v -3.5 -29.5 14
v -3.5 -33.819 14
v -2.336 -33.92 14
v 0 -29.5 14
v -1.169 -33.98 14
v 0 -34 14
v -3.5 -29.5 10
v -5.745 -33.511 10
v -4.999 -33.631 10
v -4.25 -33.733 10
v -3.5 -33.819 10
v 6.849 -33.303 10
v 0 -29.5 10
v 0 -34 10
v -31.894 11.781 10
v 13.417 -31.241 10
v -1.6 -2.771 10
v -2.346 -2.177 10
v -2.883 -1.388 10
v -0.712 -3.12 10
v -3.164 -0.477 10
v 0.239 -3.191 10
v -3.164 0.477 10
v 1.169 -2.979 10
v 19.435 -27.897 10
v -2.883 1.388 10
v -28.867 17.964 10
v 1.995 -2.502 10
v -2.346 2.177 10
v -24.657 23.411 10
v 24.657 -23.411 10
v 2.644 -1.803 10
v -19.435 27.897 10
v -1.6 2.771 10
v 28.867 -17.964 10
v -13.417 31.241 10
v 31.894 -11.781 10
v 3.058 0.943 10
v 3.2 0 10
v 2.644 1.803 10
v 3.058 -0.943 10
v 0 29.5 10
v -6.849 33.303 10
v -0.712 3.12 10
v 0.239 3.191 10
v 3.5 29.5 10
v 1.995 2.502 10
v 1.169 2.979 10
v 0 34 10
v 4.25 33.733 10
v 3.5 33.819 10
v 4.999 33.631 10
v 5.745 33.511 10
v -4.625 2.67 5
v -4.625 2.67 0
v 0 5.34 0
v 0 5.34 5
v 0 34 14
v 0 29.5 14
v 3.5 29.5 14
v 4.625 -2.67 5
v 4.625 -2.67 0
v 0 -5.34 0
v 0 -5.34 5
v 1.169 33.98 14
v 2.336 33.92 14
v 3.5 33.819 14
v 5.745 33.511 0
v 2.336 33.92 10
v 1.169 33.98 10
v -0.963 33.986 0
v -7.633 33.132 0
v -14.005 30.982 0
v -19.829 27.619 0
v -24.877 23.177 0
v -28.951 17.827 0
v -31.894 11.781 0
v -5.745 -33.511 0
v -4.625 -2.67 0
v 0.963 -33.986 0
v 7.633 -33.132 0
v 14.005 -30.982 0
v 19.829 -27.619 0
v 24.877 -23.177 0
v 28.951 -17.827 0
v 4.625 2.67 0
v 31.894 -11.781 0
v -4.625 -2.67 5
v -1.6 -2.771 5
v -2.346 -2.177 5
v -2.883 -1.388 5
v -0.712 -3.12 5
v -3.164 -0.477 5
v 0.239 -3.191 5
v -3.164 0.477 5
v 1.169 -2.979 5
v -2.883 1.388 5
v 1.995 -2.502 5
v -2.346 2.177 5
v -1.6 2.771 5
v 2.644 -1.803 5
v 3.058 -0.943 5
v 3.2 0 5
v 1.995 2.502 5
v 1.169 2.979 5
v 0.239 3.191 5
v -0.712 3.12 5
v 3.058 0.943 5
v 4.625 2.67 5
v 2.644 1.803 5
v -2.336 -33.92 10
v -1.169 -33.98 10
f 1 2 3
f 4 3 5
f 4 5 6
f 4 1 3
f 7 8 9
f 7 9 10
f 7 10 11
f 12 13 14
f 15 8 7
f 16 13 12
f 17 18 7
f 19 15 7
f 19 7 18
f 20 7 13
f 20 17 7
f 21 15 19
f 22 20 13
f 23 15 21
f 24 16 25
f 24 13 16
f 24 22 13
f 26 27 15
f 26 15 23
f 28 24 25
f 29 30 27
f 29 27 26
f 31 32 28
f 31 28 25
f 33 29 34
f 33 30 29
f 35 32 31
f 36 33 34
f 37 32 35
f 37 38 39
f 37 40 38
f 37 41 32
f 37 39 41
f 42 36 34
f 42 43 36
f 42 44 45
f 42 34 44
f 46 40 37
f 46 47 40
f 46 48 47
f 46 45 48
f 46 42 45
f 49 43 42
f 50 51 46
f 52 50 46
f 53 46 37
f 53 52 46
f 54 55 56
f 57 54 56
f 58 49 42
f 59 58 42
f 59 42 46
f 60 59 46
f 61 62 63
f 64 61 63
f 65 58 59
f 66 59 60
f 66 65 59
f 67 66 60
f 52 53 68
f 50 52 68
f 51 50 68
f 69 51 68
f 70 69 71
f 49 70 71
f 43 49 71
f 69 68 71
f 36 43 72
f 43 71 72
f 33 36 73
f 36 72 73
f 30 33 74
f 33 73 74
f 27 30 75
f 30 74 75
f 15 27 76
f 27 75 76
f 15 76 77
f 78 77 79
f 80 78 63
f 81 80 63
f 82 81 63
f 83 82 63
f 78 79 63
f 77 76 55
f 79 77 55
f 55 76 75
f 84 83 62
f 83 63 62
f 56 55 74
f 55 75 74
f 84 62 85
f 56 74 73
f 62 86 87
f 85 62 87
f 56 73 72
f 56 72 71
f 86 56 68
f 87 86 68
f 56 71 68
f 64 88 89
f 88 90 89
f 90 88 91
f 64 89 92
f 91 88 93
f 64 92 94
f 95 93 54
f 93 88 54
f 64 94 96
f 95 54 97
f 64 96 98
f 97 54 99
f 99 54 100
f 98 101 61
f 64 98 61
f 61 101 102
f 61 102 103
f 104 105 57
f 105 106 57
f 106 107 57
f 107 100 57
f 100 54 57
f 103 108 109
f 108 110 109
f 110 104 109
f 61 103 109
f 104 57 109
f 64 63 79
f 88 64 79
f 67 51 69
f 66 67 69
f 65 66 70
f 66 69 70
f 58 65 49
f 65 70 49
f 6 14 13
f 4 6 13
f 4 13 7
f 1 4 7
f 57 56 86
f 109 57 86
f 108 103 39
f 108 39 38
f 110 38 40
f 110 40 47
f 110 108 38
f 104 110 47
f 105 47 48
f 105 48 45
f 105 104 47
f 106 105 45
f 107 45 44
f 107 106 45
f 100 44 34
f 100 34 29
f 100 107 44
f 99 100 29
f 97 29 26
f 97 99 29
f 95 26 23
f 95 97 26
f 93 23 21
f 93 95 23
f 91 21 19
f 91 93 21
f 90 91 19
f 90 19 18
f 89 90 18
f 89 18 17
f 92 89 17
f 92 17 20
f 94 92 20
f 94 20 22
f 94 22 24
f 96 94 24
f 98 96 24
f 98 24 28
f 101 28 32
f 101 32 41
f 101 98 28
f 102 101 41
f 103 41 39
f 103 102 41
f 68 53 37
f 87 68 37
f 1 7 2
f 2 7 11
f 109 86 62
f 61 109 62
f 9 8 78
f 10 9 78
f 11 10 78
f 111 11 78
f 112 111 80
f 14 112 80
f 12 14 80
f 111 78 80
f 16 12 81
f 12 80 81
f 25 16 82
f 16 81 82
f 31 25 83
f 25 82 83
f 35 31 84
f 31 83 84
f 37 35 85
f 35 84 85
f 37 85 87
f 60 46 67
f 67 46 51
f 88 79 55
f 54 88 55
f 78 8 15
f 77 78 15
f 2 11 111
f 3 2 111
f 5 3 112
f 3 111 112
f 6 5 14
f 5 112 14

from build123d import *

# Parameters (mm, degrees)
F0_R     = 34
F1_DEPTH = 5
F2_R     = 34
F2_R_2   = 3.2
F3_DEPTH = 5
F5_DEPTH = 10.001
F6_DEPTH = 4


with BuildPart() as f1:
    # F0 (on Top) → F1 (new body)
    with BuildSketch(Plane.XY):
        Circle(F0_R)
        Polygon((0, 5.34048999), (4.625, 2.670244995), (4.625, -2.670244995), (0, -5.34048999), (-4.625, -2.670244995), (-4.625, 2.670244995), align=None, mode=Mode.SUBTRACT)
    extrude(amount=F1_DEPTH)

    # F2 (on face) → F3 (join)
    with BuildSketch(Plane.XY.offset(5)):
        Circle(F2_R)
        Polygon((-4.625, -2.670244995), (-4.625, 2.670244995), (0, 5.34048999), (4.625, 2.670244995), (4.625, -2.670244995), (0, -5.34048999), align=None, mode=Mode.SUBTRACT)
        Polygon((0, 5.34048999), (-4.625, 2.670244995), (-4.625, -2.670244995), (0, -5.34048999), (4.625, -2.670244995), (4.625, 2.670244995), align=None)
        Circle(F2_R_2, mode=Mode.SUBTRACT)
    extrude(amount=F3_DEPTH)

    # F4 (on face) → F5 (cut, through all)
    with BuildSketch(Plane.XY.offset(10)):
        with BuildLine():
            ThreePointArc((34, 0), (25.9934550819, 21.9166670118), (5.7446886526, 33.5111705597))
            Line((5.7446886526, 33.5111705597), (31.8938693416, -11.7805389699))
            ThreePointArc((31.8938693416, -11.7805389699), (33.4693259389, -5.9836628575), (34, 0))
        make_face()
        with BuildLine():
            Line((-5.7446886526, -33.5111705597), (-31.8938693416, 11.7805389699))
            ThreePointArc((-31.8938693416, 11.7805389699), (-29.4448637287, -17), (-5.7446886526, -33.5111705597))
        make_face()
    extrude(amount=-F5_DEPTH, mode=Mode.SUBTRACT)

    # F4 (on face) → F6 (join)
    with BuildSketch(Plane.XY.offset(10)):
        with BuildLine():
            ThreePointArc((3.5, 33.8193731462), (1.7523288833, 33.9548132595), (0, 34))
            Line((0, 34), (0, 29.5))
            Line((0, 29.5), (3.5, 29.5))
            Line((3.5, 29.5), (3.5, 33.8193731462))
        make_face()
        with BuildLine():
            Line((-3.5, -29.5), (-3.5, -33.8193731462))
            ThreePointArc((-3.5, -33.8193731462), (-1.7523288833, -33.9548132595), (0, -34))
            Line((0, -34), (0, -29.5))
            Line((0, -29.5), (-3.5, -29.5))
        make_face()
    extrude(amount=F6_DEPTH)


solid = f1.part
